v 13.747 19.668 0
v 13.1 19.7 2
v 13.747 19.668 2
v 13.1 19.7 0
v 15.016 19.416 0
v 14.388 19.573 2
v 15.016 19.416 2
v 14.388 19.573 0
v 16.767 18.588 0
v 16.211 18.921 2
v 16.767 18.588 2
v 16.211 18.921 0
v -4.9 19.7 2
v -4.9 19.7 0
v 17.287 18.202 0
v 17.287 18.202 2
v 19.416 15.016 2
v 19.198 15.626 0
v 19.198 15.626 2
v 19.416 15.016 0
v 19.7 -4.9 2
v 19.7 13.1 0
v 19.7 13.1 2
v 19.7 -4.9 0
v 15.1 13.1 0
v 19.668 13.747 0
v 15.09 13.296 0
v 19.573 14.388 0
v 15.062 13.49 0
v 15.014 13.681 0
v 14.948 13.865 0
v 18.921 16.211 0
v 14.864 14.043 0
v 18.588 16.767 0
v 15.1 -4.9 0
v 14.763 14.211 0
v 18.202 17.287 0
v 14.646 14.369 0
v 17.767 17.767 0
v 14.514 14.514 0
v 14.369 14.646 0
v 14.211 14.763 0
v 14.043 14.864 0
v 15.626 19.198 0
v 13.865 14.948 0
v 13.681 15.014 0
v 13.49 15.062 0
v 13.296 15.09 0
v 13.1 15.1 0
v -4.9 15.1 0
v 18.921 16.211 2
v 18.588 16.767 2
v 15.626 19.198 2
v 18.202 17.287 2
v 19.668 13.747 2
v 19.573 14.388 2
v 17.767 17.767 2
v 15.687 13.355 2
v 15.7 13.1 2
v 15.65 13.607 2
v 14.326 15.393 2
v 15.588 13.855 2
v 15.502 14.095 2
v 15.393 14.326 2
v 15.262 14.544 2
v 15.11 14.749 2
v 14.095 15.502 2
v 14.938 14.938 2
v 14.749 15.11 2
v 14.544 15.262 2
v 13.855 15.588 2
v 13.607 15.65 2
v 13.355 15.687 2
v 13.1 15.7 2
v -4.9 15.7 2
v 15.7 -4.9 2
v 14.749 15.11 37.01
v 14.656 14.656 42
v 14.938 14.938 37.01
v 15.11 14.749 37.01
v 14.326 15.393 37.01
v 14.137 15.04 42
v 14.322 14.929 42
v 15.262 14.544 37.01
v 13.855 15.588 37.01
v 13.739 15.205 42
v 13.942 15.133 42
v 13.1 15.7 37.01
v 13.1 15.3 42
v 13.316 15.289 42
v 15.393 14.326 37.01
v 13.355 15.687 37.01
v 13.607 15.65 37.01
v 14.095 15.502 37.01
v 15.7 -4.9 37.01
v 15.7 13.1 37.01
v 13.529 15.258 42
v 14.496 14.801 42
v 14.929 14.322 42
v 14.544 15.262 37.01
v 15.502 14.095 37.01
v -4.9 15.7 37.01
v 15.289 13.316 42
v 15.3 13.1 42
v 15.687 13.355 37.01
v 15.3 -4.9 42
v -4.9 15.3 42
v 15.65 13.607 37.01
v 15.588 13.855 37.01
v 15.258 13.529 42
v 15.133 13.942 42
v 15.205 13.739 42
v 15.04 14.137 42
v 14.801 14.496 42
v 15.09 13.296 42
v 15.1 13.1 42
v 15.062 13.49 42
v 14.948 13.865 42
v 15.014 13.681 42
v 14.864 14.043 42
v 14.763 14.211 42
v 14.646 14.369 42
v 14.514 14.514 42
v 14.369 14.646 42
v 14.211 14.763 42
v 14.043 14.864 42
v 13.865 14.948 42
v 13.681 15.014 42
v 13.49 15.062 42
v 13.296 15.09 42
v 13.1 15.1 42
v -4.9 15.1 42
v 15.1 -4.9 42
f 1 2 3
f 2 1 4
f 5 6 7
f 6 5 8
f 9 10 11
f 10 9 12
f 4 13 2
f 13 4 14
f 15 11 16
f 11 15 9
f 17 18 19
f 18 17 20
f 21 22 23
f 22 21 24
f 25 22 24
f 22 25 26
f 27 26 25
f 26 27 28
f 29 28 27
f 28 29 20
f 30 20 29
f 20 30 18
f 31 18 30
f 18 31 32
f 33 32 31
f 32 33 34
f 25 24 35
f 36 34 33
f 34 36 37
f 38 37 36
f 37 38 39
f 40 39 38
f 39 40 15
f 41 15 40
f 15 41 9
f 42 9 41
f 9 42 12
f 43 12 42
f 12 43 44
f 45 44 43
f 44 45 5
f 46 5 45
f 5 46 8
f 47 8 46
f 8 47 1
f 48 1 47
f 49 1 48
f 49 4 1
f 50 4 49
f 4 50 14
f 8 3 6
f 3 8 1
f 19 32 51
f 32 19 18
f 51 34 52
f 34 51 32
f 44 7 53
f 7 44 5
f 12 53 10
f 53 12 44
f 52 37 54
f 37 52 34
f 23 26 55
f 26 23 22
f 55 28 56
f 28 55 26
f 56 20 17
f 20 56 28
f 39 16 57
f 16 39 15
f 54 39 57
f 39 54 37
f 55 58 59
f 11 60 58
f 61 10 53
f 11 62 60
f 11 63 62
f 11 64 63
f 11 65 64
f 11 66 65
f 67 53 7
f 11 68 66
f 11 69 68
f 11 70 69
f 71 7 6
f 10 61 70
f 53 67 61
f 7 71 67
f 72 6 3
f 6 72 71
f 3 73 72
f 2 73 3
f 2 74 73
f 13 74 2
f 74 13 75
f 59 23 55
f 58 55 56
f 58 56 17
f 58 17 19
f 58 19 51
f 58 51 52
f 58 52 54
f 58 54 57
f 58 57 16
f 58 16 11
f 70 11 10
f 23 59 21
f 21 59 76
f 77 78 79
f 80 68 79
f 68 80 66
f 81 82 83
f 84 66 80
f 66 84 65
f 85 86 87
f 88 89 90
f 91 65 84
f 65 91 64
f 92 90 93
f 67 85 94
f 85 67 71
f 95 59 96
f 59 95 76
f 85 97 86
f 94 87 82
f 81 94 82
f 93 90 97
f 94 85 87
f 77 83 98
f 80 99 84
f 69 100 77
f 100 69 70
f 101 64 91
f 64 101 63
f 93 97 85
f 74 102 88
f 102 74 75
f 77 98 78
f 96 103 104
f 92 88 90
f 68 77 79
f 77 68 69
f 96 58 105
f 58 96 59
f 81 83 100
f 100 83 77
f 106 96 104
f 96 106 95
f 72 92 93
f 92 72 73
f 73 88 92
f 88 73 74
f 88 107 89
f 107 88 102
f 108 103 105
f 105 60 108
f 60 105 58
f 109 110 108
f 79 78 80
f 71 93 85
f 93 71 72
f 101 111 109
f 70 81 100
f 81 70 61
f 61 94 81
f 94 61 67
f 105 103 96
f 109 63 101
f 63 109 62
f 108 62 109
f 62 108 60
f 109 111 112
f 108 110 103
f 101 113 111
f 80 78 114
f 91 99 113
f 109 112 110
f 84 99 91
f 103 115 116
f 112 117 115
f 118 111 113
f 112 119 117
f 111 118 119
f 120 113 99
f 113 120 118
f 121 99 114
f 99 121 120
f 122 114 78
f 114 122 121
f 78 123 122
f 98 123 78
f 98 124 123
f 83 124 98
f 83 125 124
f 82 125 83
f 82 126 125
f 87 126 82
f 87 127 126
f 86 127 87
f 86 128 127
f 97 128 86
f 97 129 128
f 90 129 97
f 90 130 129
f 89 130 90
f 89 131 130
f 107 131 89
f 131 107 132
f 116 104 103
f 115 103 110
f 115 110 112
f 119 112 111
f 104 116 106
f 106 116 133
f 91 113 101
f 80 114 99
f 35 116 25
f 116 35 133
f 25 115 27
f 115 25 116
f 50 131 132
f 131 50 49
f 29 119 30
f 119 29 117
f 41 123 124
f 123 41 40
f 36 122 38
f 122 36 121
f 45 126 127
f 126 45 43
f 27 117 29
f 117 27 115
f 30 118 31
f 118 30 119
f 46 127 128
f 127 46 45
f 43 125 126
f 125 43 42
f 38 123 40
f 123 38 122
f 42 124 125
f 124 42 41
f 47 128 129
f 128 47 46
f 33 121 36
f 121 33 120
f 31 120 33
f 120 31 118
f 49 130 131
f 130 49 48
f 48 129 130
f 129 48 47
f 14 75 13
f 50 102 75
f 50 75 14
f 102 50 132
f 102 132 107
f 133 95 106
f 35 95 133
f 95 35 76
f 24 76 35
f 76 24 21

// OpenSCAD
// =====================================
// Square Post Shim (L-shaped corner shim)
// Takes up play between a ~30 mm square exercise-bike post and its socket.
// Wraps one corner of the post, shimming two adjacent faces at once; the
// flange hooks over the socket collar rim so it can't drop down the tube.
// Modeled flange-down in print orientation: prints upright, no supports.
// =====================================

$fn = 64;

// ---- Parameters (mm) ----
post_w = 30.2;      // post outer width (caliper, smaller axis)
post_r = 2;         // post outer corner radius
shim_t = 0.6;       // wall thickness on each face
leg_len = 20;       // length of each leg along a post face, from the outer corner
shim_len = 40;      // insertion depth below the flange
lip_depth = 4;      // flange reach outward over the socket rim
lip_t = 2;          // flange thickness
lead_in = 5;        // height of the tapered tip on the free end
lead_in_t = 0.2;    // wall thickness at the very tip

// ---- Derived ----
half = post_w / 2;
total_h = lip_t + shim_len;

assert(shim_t > 0, "shim_t must be positive");
assert(lip_depth > 0, "lip_depth must be positive");
assert(lead_in < shim_len, "lead_in must be shorter than shim_len");
assert(lead_in_t <= shim_t, "lead_in_t must not exceed shim_t");
assert(leg_len > post_r && leg_len < post_w, "leg_len must be between post_r and post_w");

// Rounded square centred on the origin with half-width h and corner radius r
module rounded_square(h, r) {
    offset(r = r) square(2 * (h - r), center = true);
}

module square_post_shim() {
    intersection() {
        difference() {
            union() {
                // Flange over the socket rim
                linear_extrude(height = lip_t)
                    rounded_square(half + shim_t + lip_depth, post_r + shim_t + lip_depth);
                // Shim wall with tapered lead-in at the free end
                hull() {
                    linear_extrude(height = 0.01)
                        rounded_square(half + shim_t, post_r + shim_t);
                    translate([0, 0, total_h - lead_in])
                        linear_extrude(height = 0.01)
                            rounded_square(half + shim_t, post_r + shim_t);
                    translate([0, 0, total_h - 0.01])
                        linear_extrude(height = 0.01)
                            rounded_square(half + lead_in_t, post_r + lead_in_t);
                }
            }
            // The post itself
            translate([0, 0, -1])
                linear_extrude(height = total_h + 2)
                    rounded_square(half, post_r);
        }
        // Keep only one corner: two legs of leg_len along adjacent faces
        translate([half - leg_len, half - leg_len, -1])
            cube([leg_len + shim_t + lip_depth + 1, leg_len + shim_t + lip_depth + 1, total_h + 2]);
    }
}

square_post_shim();
